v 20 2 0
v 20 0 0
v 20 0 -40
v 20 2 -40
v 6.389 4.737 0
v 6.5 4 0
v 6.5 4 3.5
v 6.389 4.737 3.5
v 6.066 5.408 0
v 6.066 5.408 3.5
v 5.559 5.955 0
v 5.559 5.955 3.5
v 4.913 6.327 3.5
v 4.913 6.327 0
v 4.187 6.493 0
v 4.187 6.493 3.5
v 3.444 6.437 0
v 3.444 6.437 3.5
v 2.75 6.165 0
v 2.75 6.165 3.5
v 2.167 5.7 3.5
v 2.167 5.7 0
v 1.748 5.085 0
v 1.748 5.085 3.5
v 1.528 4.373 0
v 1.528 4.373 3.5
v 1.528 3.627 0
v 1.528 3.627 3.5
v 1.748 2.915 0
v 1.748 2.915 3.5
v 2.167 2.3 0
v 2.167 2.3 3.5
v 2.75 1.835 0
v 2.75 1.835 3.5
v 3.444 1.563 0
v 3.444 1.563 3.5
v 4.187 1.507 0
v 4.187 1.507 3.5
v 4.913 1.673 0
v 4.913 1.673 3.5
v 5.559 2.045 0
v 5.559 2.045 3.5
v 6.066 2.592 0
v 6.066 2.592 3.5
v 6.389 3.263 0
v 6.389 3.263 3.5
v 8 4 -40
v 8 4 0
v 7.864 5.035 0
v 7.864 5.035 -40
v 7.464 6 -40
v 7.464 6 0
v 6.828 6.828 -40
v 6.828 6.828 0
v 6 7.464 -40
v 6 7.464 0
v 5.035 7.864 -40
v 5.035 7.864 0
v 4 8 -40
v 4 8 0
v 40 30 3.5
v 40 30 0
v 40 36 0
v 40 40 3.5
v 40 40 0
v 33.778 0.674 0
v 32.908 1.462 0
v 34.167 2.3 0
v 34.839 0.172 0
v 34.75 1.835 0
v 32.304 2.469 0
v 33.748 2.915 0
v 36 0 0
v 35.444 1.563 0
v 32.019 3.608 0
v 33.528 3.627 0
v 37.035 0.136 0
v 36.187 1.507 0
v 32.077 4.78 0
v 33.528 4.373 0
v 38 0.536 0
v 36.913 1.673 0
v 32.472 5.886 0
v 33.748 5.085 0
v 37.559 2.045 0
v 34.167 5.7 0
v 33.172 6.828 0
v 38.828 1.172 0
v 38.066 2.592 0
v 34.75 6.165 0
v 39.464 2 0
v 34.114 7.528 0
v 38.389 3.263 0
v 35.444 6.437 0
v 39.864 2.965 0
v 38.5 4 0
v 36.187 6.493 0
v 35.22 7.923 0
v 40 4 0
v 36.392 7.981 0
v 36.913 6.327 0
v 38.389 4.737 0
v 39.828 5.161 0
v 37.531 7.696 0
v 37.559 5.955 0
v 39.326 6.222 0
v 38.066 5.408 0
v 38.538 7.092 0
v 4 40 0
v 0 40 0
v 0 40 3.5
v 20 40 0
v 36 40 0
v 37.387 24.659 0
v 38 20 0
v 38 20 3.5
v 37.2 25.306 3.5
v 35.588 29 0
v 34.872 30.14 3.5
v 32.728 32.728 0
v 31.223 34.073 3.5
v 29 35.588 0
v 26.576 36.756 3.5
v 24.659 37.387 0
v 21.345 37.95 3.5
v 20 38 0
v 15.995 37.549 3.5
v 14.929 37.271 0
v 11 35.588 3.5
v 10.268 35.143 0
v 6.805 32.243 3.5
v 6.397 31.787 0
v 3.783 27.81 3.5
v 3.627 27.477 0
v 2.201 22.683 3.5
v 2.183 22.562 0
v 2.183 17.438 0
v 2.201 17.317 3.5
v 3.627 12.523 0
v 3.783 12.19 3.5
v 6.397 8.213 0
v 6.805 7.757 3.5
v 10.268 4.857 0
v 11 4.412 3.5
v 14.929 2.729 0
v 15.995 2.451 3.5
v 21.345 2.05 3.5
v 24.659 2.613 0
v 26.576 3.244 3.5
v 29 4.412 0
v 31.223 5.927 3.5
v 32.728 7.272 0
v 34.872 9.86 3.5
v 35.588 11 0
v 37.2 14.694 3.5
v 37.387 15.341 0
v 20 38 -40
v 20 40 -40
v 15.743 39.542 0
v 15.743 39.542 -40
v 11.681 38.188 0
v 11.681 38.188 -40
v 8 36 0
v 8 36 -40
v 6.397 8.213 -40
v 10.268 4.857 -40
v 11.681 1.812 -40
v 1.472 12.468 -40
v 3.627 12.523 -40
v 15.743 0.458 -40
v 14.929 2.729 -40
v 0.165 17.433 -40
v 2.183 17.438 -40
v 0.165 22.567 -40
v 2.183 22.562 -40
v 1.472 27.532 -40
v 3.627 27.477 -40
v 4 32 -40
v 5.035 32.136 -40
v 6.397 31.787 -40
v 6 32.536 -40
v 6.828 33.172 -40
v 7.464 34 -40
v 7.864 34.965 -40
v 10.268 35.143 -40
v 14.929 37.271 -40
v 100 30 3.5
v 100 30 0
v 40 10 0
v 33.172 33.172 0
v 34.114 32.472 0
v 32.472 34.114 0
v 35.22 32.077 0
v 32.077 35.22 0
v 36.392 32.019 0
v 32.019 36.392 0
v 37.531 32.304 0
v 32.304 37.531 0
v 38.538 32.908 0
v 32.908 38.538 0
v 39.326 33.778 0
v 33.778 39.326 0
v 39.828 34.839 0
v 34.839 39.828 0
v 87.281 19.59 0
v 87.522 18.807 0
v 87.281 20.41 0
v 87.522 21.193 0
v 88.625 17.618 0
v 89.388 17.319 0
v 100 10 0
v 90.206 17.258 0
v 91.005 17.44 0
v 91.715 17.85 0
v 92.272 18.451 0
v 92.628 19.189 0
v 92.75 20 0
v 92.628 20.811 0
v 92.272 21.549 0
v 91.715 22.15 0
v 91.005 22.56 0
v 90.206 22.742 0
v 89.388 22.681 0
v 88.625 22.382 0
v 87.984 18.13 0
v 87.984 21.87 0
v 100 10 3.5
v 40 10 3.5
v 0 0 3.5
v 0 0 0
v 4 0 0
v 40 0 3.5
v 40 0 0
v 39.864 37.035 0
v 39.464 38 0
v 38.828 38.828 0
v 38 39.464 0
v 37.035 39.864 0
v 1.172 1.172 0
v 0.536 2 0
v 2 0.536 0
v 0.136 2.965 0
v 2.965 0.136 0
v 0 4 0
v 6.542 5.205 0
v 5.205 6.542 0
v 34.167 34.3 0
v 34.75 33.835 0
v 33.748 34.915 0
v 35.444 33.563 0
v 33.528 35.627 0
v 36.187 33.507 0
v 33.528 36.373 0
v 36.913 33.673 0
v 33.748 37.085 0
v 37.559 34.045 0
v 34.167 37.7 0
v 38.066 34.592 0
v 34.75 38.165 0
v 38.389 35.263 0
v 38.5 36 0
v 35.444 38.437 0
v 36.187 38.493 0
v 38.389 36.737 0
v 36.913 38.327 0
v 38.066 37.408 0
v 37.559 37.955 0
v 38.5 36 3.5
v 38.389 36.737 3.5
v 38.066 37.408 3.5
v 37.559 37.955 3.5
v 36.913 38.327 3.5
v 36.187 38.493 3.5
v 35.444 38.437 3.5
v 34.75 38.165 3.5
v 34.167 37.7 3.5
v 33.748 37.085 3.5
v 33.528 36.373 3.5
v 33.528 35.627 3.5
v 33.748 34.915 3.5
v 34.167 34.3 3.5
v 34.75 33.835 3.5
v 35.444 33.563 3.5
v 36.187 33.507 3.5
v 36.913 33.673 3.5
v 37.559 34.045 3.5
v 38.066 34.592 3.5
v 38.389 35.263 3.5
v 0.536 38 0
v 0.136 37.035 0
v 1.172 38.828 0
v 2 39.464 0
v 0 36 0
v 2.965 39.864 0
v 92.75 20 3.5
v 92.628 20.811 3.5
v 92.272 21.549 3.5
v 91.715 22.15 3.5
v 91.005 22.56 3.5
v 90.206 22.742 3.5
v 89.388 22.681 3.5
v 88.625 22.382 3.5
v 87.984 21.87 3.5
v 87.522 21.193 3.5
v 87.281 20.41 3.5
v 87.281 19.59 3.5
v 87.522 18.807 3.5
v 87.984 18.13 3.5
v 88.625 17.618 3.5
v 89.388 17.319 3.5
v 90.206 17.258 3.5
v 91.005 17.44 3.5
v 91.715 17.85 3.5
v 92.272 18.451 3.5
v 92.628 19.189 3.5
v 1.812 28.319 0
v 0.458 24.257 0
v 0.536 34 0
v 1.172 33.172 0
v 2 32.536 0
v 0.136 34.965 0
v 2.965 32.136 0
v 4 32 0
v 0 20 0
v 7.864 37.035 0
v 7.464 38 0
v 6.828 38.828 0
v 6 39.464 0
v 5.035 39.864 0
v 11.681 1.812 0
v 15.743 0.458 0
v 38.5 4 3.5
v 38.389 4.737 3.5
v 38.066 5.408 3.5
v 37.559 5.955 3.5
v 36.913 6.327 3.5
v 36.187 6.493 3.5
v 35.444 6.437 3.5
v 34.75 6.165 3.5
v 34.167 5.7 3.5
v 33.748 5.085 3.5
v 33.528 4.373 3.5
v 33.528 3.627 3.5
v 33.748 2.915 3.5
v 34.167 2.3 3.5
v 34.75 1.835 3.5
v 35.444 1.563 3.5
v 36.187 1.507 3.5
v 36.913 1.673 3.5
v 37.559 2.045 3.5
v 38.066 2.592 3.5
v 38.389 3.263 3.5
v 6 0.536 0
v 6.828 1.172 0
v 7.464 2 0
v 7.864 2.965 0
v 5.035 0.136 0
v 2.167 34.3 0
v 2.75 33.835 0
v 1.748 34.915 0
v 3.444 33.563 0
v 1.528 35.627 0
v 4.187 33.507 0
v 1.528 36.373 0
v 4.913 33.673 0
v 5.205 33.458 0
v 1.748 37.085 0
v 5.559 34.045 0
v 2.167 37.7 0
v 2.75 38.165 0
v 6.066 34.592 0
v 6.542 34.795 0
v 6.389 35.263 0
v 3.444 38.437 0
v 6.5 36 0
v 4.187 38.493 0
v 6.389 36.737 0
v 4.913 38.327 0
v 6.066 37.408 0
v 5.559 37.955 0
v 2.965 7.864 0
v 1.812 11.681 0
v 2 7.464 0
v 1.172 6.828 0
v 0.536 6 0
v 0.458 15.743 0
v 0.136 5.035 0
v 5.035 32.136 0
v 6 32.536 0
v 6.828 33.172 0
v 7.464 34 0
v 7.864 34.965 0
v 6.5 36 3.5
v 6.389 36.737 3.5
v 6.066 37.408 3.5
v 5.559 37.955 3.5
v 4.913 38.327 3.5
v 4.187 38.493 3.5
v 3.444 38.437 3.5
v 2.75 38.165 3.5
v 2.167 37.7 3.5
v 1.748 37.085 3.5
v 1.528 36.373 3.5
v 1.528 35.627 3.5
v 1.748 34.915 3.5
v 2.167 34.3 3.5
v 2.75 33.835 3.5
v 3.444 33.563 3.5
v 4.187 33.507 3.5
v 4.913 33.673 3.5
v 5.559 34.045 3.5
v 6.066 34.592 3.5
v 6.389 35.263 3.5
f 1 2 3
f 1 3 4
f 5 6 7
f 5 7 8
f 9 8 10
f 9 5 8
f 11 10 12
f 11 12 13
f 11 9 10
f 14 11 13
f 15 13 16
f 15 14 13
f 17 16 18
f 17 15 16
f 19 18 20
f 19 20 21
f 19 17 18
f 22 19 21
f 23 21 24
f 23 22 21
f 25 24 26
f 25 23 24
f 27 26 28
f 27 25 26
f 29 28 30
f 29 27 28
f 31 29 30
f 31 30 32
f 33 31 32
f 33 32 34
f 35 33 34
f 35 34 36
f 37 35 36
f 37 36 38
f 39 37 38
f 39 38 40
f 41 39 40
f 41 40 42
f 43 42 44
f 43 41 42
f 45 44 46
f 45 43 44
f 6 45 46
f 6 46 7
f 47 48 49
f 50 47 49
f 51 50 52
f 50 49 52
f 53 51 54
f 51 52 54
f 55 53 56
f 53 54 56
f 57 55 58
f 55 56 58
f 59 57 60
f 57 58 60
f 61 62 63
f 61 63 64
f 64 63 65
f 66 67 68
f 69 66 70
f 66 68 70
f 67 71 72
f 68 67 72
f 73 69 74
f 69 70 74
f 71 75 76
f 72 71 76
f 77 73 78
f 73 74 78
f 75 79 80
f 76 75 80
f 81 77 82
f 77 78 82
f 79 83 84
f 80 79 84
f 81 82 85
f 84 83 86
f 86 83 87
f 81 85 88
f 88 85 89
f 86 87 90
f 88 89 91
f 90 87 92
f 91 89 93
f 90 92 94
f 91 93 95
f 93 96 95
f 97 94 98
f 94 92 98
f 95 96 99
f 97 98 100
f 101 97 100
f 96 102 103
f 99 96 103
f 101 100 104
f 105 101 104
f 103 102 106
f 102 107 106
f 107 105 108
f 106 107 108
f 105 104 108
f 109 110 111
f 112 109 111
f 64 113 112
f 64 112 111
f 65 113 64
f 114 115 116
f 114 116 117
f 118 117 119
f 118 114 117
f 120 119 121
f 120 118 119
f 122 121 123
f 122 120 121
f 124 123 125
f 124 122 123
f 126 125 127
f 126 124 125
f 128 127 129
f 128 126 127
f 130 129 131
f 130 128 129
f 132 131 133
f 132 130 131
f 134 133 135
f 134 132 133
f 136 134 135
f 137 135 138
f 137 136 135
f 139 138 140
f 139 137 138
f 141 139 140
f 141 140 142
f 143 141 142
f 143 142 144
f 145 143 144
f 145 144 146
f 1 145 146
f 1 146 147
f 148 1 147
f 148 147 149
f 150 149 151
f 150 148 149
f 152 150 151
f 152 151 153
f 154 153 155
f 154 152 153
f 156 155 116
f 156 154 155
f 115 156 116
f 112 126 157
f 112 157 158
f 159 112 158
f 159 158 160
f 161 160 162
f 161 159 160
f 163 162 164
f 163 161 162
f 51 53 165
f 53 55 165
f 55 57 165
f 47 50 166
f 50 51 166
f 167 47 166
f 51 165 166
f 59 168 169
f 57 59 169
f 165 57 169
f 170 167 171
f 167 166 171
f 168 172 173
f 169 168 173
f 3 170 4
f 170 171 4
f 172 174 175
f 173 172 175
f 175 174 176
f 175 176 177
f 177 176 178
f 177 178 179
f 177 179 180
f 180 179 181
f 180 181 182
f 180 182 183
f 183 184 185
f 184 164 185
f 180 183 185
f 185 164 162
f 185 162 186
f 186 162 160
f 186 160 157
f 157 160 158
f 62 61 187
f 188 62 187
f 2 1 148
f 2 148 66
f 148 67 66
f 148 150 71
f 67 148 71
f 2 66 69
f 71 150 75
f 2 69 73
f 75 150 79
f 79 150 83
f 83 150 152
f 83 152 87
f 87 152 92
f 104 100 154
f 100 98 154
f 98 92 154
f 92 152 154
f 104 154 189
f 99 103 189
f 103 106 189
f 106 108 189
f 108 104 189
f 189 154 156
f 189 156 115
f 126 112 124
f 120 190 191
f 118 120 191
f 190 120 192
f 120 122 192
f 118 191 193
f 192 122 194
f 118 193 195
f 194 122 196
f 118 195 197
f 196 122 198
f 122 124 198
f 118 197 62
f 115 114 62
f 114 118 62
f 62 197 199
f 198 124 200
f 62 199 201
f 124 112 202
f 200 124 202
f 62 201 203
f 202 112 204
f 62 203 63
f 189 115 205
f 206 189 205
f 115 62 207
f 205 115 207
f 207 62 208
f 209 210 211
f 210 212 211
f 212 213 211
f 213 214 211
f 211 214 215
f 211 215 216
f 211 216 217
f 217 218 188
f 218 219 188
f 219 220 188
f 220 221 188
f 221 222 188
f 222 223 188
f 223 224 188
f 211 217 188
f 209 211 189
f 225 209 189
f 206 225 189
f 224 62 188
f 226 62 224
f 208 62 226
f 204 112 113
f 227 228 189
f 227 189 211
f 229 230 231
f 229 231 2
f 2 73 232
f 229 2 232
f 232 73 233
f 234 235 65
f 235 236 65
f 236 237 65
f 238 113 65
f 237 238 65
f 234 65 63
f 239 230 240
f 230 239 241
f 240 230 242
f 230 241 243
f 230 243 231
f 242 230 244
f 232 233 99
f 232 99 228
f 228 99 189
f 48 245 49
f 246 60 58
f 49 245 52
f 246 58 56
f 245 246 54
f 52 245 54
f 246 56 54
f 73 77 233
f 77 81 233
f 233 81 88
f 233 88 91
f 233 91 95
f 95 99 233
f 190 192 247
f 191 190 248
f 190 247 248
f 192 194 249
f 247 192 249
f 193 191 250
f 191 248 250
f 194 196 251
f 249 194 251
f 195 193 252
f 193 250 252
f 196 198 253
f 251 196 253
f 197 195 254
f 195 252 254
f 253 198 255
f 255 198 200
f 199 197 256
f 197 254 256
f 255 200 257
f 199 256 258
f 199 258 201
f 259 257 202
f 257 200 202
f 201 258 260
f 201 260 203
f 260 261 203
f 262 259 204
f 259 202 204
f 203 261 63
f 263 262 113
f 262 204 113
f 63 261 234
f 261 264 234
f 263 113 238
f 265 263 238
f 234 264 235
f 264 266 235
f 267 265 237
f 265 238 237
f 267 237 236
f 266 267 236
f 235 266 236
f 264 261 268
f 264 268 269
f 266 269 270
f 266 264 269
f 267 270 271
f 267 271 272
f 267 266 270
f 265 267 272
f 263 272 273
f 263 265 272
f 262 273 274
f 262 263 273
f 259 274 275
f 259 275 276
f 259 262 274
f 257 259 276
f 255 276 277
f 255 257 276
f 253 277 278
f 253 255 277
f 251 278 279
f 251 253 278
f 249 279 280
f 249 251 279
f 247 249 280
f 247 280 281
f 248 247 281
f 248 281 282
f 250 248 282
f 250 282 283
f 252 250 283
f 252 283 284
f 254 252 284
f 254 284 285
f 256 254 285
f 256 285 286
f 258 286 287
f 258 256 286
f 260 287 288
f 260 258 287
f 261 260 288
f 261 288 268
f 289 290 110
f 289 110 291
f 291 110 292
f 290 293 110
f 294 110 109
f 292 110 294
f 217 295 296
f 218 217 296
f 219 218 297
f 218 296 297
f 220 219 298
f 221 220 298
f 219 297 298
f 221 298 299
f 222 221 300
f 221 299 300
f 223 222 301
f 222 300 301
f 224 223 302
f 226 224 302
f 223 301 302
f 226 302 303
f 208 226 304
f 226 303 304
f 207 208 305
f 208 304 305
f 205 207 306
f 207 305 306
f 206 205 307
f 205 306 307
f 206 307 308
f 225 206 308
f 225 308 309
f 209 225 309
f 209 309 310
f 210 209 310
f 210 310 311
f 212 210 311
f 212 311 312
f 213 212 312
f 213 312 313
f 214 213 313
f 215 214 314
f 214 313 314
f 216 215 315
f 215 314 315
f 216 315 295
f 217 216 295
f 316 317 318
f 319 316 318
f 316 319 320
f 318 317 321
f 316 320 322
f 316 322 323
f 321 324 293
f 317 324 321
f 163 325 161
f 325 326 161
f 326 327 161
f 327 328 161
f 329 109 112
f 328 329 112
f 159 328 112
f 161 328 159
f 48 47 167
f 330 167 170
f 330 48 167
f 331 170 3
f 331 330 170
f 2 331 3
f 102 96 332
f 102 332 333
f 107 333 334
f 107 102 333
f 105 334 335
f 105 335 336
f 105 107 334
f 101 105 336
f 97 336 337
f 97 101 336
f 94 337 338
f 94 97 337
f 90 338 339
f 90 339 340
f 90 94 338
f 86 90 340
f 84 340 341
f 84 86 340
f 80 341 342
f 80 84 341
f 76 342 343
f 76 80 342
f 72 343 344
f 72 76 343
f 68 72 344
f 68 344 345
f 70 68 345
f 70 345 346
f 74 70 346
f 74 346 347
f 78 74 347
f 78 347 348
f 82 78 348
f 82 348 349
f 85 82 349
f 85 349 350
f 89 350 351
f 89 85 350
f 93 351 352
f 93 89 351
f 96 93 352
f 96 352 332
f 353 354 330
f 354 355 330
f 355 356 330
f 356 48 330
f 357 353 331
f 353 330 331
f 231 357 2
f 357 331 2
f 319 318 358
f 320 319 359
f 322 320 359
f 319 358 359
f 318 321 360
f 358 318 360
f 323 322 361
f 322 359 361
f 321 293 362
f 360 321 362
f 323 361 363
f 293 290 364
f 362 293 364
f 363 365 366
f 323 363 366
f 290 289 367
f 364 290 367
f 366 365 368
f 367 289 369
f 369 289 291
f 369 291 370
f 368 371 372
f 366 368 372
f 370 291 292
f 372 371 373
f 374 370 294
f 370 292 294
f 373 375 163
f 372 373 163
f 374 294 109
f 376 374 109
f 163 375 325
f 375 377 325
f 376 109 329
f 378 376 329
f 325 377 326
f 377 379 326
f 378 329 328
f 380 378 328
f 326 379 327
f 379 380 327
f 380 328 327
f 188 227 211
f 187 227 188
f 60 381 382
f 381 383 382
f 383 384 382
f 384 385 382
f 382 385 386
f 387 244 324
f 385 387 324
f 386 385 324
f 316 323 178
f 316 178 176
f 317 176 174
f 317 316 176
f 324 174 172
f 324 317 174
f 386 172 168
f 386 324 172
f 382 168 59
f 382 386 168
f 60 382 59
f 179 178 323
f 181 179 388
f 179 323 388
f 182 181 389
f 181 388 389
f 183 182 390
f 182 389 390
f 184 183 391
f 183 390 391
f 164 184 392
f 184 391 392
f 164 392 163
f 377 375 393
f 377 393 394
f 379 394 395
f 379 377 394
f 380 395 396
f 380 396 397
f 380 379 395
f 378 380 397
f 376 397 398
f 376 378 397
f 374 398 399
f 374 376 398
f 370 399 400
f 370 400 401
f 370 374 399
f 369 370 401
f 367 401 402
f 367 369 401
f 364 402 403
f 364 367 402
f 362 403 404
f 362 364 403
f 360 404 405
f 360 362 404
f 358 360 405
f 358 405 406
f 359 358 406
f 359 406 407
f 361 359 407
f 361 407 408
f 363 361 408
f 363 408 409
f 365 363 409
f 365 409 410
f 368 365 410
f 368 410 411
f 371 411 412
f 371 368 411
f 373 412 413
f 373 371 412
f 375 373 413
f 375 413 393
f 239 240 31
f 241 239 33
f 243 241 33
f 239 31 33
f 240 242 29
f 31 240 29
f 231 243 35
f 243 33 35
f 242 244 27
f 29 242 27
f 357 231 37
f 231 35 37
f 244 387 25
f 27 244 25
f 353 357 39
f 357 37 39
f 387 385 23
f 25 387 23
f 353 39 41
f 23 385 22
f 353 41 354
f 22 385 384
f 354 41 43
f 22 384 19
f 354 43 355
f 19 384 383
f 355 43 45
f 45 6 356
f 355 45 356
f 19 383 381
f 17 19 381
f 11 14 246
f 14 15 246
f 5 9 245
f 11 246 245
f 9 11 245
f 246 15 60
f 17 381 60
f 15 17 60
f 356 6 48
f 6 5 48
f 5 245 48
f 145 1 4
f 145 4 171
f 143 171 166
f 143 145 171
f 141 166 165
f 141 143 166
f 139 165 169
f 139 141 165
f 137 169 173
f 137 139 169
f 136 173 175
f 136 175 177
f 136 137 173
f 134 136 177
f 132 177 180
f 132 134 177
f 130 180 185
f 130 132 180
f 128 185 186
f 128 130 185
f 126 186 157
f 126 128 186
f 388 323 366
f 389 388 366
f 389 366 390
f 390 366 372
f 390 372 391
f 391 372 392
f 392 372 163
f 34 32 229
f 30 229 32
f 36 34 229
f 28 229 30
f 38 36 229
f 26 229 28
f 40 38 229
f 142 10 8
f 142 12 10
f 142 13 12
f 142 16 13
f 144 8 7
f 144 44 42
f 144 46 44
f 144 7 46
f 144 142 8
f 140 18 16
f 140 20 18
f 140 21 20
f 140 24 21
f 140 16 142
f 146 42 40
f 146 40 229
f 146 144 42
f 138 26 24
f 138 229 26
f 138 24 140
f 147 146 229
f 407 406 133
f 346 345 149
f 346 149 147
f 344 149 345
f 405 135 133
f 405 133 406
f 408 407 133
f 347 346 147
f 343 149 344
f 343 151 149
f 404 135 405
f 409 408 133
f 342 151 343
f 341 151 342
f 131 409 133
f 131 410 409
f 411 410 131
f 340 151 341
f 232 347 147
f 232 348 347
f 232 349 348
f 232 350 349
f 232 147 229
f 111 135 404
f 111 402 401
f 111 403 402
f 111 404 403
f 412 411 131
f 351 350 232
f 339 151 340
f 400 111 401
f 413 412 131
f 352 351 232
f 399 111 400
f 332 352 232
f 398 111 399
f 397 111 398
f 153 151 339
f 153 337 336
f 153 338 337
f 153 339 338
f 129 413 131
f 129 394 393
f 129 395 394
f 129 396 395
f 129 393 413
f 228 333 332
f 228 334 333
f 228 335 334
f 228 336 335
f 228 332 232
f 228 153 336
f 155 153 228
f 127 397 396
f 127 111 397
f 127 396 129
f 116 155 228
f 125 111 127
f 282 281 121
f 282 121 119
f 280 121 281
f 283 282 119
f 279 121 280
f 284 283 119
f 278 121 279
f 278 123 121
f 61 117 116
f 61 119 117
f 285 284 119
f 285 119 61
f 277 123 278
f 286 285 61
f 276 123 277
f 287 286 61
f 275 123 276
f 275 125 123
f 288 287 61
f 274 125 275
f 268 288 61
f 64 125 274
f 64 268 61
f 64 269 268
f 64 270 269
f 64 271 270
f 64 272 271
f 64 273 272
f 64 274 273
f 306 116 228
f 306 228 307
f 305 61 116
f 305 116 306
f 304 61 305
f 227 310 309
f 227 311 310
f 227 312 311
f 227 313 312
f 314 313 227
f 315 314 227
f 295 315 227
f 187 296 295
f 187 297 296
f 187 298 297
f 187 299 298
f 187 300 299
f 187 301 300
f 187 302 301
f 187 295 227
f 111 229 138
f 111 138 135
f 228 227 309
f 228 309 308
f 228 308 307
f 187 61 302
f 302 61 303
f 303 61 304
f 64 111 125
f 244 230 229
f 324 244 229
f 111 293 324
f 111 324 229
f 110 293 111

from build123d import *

# Parameters (mm, degrees)
F0_W     = 40
F0_H     = 40
F0_R     = 2.5
F0_R_2   = 18
F1_DEPTH = 3.5
F2_W     = 60
F2_H     = 20
F2_R     = 2.75
F3_DEPTH = 3.5
F7_DEPTH = 40
F8_R     = 4
F9_DEPTH = 40.001


with BuildPart() as f1:
    # F0 (on Top) → F1 (new body)
    with BuildSketch(Plane.XY):
        with Locations((20, 20)):
            Rectangle(F0_W, F0_H)
        with Locations((4, 4)):
            Circle(F0_R, mode=Mode.SUBTRACT)
        with Locations((36, 4)):
            Circle(F0_R, mode=Mode.SUBTRACT)
        with Locations((4, 36)):
            Circle(F0_R, mode=Mode.SUBTRACT)
        with Locations((20, 20)):
            Circle(F0_R_2, mode=Mode.SUBTRACT)
        with Locations((36, 36)):
            Circle(F0_R, mode=Mode.SUBTRACT)
    extrude(amount=F1_DEPTH)

    # F2 (on face) → F3 (join, through all)
    with BuildSketch(Plane.XY.offset(3.5)):
        with Locations((70, 20)):
            Rectangle(F2_W, F2_H)
        with Locations((90, 20)):
            Circle(F2_R, mode=Mode.SUBTRACT)
    extrude(amount=-F3_DEPTH)

    # F6 (on face) → F7 (join, through all)
    with BuildSketch(Plane.XY):
        with BuildLine():
            Line((20, 38), (20, 40))
            ThreePointArc((20, 40), (0, 20), (20, 0))
            Line((20, 0), (20, 2))
            ThreePointArc((20, 2), (2, 20), (20, 38))
        make_face()
    extrude(amount=-F7_DEPTH)

    # F8 (on face) → F9 (cut, through all)
    with BuildSketch(Plane.XY):
        with Locations((36, 36)):
            Circle(F8_R)
        with Locations((4, 36)):
            Circle(F8_R)
        with Locations((4, 4)):
            Circle(F8_R)
        with Locations((36, 4)):
            Circle(F8_R)
    extrude(amount=-F9_DEPTH, mode=Mode.SUBTRACT)


solid = f1.part
